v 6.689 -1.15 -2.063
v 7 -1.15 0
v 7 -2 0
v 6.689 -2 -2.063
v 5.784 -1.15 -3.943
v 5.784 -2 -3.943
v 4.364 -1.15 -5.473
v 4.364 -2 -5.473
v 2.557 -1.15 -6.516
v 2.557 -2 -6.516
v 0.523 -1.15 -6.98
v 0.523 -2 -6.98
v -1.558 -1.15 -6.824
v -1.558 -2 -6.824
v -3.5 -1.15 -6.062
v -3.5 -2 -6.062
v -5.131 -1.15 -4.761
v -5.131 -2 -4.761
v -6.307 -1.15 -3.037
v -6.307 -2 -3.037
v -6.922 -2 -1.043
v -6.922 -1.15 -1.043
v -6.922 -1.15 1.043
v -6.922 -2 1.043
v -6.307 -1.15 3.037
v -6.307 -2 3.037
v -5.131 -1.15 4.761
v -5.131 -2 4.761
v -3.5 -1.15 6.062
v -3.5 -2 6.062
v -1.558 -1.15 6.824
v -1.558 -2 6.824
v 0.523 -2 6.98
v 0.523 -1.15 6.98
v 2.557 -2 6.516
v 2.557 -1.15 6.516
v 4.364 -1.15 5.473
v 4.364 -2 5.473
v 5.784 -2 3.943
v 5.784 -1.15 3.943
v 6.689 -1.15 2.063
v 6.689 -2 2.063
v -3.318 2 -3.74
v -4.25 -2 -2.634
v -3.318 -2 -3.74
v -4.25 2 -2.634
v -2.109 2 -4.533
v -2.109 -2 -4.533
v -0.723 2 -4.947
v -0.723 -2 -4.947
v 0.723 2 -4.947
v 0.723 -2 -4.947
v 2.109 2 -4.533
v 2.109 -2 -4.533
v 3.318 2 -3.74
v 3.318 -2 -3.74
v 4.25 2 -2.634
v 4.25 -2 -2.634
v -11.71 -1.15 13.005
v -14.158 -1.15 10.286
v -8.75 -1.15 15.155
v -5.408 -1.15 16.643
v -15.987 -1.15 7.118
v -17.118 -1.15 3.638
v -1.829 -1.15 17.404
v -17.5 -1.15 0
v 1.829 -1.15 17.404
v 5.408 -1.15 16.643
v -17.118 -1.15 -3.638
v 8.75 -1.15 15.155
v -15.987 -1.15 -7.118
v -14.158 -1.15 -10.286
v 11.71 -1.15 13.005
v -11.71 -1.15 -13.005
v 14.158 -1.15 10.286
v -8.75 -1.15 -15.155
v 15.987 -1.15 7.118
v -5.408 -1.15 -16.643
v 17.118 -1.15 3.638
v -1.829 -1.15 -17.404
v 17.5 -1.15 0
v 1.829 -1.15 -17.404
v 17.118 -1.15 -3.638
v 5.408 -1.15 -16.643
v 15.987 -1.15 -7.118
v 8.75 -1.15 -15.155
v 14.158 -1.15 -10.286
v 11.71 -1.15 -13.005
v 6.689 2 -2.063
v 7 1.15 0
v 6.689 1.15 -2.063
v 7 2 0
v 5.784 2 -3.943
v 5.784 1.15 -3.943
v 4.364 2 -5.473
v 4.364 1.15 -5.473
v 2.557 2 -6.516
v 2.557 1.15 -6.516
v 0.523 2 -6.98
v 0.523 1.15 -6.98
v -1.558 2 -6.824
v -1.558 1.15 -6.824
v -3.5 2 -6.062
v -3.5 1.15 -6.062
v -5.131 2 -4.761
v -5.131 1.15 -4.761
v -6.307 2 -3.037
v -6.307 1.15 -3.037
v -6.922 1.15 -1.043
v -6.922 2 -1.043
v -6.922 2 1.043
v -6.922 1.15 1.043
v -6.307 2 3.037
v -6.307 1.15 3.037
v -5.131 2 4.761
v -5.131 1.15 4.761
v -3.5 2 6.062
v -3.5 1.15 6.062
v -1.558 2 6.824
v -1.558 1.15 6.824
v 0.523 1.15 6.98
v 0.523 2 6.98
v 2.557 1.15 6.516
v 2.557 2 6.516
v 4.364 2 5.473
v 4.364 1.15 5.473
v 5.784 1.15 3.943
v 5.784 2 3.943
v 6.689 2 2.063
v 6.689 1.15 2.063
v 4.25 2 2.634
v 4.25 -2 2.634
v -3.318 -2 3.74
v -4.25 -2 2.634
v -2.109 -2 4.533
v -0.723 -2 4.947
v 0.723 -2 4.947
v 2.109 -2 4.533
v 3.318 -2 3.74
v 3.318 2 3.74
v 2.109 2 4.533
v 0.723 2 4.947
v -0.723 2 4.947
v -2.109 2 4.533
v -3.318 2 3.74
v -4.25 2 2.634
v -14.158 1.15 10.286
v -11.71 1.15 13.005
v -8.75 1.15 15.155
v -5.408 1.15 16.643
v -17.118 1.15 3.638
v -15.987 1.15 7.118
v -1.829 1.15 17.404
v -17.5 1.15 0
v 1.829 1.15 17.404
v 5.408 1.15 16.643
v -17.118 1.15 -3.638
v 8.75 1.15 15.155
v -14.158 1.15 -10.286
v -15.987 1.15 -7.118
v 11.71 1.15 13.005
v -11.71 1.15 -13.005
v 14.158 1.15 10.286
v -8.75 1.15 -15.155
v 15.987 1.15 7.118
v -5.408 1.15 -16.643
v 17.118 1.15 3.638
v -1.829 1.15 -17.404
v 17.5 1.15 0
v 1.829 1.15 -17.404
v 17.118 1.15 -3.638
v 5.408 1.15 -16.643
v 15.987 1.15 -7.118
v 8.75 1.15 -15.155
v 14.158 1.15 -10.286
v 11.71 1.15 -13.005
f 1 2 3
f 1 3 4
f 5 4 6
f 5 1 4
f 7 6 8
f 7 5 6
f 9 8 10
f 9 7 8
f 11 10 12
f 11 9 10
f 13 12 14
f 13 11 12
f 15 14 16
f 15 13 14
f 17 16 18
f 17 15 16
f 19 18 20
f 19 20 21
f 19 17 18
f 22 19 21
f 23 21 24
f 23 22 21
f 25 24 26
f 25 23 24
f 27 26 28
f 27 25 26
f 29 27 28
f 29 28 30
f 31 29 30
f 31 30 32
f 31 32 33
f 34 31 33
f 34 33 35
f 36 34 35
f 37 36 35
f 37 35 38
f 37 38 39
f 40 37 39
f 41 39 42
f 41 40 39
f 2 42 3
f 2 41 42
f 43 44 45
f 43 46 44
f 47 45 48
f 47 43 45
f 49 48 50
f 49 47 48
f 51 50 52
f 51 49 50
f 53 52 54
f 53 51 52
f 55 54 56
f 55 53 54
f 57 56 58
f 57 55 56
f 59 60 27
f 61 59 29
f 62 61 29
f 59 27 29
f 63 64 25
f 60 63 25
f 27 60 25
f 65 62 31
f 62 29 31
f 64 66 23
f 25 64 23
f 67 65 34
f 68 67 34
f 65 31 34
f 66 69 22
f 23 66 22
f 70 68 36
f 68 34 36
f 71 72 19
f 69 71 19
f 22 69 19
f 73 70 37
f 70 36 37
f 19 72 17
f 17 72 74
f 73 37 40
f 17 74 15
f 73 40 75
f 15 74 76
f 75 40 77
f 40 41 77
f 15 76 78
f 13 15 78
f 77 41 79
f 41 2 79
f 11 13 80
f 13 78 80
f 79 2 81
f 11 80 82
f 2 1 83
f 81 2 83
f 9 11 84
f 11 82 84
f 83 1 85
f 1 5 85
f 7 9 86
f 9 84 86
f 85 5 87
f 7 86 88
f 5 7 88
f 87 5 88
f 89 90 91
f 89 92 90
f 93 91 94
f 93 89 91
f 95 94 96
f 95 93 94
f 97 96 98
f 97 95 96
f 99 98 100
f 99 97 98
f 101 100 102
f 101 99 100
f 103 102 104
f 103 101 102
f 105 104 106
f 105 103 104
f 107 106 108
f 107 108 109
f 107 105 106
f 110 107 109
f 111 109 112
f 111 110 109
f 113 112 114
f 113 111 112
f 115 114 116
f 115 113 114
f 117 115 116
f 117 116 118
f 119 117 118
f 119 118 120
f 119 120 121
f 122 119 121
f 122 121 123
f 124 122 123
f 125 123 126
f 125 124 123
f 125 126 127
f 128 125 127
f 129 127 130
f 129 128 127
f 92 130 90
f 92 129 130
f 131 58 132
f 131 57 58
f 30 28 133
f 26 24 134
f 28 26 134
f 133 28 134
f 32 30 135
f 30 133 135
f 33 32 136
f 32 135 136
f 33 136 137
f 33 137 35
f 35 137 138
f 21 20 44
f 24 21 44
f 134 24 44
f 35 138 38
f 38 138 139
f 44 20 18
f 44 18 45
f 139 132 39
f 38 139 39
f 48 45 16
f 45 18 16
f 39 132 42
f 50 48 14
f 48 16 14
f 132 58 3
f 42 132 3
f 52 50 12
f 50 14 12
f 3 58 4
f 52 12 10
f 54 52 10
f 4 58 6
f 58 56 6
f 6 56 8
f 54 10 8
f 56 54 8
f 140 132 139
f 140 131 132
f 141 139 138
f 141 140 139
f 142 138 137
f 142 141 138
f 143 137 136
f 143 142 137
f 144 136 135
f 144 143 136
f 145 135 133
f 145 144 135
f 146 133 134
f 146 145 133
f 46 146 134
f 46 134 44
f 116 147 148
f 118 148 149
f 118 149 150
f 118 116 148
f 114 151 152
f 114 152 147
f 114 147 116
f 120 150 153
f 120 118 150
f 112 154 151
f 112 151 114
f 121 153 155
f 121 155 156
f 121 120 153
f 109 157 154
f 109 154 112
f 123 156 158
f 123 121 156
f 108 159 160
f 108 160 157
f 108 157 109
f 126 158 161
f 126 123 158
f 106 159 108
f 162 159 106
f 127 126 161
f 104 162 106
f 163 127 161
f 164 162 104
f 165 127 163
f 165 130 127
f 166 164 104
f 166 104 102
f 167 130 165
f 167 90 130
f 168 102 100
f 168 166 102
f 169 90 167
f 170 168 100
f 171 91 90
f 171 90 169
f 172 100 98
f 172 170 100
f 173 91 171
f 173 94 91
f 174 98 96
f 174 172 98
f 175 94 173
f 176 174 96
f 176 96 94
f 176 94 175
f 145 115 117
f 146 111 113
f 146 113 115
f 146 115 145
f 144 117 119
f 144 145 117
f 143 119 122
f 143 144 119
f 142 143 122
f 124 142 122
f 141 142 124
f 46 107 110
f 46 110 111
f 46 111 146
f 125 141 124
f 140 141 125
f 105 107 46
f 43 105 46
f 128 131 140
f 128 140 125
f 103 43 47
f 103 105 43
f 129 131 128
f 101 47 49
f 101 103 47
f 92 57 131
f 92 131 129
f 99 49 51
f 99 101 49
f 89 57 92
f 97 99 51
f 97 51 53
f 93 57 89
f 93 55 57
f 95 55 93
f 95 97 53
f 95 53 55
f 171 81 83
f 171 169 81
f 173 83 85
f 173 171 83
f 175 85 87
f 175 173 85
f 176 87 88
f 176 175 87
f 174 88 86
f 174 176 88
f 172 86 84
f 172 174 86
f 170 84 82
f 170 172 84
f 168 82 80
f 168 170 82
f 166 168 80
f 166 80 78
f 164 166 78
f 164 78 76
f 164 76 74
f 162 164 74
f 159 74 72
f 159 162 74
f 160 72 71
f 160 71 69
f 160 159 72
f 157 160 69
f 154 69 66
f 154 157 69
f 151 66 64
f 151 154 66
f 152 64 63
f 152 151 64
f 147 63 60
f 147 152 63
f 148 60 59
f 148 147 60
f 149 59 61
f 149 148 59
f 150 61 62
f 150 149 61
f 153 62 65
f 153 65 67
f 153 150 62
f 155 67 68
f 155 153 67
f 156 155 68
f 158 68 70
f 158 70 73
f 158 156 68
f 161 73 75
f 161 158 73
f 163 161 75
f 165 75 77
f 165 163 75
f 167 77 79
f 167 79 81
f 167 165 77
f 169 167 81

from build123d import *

# Parameters (mm, degrees)
SKETCH1_R           = 7
BOSS_EXTRUDE1_DEPTH = 2
SKETCH1_3_R         = 17.5
SKETCH1_3_R_2       = 7
BOSS_EXTRUDE2_DEPTH = 1.15


with BuildPart() as part:
    # Sketch1 → Boss-Extrude1 (new, symmetric)
    with BuildSketch(Plane(origin=(0, 0, 0), x_dir=(1, 0, 0), z_dir=(0, 1, 0))):
        Circle(SKETCH1_R)
        with BuildLine():
            Line((-4.25, -2.633913438), (-4.25, 2.633913438))
            ThreePointArc((-4.25, 2.633913438), (0, 5), (4.25, 2.633913438))
            Line((4.25, 2.633913438), (4.25, -2.633913438))
            ThreePointArc((4.25, -2.633913438), (0, -5), (-4.25, -2.633913438))
        make_face(mode=Mode.SUBTRACT)
    extrude(amount=BOSS_EXTRUDE1_DEPTH, both=True)

    # Sketch1<3> → Boss-Extrude2 (add, symmetric)
    with BuildSketch(Plane(origin=(0, 0, 0), x_dir=(1, 0, 0), z_dir=(0, 1, 0))):
        Circle(SKETCH1_3_R)
        Circle(SKETCH1_3_R_2, mode=Mode.SUBTRACT)
    extrude(amount=BOSS_EXTRUDE2_DEPTH, both=True)


solid = part.part
